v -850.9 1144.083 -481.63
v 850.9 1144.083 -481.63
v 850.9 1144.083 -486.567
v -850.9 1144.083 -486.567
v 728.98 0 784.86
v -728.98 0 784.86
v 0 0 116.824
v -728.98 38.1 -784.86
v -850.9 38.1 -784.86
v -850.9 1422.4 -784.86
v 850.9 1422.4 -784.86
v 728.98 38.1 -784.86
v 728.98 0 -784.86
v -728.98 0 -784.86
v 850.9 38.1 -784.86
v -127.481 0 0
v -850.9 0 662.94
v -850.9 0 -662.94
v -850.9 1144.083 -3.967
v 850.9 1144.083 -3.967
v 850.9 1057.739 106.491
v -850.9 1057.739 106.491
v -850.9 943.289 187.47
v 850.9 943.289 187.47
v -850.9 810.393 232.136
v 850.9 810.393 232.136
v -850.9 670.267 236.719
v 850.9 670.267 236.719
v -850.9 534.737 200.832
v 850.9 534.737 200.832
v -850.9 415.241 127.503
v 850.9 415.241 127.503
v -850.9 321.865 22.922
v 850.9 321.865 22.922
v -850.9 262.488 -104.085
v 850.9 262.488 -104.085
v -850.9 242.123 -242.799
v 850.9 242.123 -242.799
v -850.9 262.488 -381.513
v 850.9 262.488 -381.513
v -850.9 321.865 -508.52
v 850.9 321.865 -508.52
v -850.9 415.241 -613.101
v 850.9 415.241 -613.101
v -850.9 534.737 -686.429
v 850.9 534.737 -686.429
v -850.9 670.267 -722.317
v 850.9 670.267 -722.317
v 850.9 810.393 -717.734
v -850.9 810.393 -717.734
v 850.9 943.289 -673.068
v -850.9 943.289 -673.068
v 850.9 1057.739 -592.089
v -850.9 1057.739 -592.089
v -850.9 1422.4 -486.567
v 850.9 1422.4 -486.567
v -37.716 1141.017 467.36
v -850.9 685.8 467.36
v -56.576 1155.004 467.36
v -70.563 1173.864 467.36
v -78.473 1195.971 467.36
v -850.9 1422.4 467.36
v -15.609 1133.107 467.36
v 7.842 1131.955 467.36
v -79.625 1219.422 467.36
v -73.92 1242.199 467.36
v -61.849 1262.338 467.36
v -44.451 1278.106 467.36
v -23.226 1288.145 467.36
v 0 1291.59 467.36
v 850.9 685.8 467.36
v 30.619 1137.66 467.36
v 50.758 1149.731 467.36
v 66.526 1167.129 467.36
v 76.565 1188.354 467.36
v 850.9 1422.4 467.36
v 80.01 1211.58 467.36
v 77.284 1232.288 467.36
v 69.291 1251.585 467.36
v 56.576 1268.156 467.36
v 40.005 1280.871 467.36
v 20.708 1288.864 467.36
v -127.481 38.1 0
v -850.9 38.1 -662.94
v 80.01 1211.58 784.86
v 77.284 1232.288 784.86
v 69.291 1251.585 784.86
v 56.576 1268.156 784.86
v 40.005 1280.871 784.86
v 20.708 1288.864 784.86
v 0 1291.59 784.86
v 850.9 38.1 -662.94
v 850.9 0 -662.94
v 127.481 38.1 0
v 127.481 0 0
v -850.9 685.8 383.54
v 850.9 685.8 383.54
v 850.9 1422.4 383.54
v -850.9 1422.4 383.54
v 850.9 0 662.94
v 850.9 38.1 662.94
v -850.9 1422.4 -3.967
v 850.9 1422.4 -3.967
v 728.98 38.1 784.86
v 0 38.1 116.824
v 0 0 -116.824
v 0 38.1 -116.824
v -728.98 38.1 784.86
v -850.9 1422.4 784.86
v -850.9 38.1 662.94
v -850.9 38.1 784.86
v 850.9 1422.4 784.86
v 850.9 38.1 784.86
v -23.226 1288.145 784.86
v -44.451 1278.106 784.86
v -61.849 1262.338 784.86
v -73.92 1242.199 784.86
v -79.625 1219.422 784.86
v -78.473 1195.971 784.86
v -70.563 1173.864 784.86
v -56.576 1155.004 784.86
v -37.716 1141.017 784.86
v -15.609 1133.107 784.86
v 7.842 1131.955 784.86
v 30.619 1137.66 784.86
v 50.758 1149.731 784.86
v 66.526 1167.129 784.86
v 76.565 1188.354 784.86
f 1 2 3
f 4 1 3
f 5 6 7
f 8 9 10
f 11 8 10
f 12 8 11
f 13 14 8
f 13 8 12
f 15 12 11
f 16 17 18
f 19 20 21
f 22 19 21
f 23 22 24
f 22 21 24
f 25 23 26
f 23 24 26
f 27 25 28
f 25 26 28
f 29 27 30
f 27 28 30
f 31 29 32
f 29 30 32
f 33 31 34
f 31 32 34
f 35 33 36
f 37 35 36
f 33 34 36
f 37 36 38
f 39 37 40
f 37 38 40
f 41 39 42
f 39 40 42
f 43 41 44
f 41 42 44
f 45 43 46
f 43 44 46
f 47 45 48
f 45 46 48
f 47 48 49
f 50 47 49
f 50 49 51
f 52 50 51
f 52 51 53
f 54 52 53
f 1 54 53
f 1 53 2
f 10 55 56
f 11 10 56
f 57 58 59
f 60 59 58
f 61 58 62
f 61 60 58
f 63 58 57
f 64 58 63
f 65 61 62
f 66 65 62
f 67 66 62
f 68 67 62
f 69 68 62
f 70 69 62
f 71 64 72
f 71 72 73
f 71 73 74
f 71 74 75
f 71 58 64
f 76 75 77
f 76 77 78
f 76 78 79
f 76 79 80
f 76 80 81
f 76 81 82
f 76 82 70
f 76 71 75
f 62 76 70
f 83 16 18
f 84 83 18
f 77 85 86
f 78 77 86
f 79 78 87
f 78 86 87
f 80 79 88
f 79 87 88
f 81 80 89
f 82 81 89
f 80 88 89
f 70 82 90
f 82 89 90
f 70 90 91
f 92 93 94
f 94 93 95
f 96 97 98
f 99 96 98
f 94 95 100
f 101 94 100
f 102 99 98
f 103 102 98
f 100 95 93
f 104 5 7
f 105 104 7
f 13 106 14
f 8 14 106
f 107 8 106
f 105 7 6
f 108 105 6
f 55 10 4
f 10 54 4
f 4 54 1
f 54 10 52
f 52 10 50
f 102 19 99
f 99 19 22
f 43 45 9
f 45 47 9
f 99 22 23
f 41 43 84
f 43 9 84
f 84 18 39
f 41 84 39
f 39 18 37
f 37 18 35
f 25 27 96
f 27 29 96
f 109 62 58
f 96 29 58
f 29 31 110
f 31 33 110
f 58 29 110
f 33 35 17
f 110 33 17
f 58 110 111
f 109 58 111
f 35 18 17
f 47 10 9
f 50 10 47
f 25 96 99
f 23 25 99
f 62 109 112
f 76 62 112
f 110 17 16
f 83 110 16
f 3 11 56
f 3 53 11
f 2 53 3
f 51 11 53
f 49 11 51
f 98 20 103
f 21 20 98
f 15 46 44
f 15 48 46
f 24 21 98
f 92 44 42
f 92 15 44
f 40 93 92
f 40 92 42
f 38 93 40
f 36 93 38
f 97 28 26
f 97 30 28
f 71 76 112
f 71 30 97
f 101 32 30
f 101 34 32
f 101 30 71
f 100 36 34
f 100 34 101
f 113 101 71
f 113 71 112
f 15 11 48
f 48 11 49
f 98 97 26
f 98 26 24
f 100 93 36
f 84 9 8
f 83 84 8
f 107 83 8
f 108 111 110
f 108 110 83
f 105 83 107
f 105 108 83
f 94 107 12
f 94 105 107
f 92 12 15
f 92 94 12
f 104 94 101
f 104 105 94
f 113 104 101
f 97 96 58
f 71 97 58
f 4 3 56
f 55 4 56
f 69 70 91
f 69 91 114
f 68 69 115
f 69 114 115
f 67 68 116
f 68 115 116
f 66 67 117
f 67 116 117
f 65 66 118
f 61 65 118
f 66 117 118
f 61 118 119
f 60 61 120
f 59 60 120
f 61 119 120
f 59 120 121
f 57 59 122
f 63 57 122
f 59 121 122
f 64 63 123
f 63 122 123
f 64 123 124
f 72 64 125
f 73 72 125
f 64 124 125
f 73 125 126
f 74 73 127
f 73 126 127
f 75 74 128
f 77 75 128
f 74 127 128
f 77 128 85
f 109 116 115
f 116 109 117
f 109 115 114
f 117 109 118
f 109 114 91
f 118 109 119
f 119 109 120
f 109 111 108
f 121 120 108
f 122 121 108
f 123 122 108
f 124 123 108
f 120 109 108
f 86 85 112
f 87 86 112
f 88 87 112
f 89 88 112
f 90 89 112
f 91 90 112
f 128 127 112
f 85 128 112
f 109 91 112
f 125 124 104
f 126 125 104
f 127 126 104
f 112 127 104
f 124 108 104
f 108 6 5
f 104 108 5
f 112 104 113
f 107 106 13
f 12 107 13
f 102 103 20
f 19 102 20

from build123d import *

# Parameters (mm, degrees)
F0_W     = 1701.8
F0_H     = 1569.72
F1_DEPTH = 1422.4
F3_DEPTH = 38.1
F5_DEPTH = 317.5
F7_DEPTH = 2110.74
F6_W     = 736.6
F6_H     = 83.82
F8_DEPTH = 3215.64


with BuildPart() as f1:
    # F0 (on Front) → F1 (new body)
    with BuildSketch(Plane.XZ):
        Rectangle(F0_W, F0_H)
    extrude(amount=-F1_DEPTH)

    # F2 (on face) → F3 (cut)
    with BuildSketch(Plane.XZ):
        Polygon((728.98, -784.86), (850.9, -784.86), (850.9, -662.94), (127.4812631579, 0), (0, -116.8236655949), align=None)
        Polygon((-728.98, -784.86), (0, -116.8236655949), (-127.4812631579, 0), (-850.9, -662.94), (-850.9, -784.86), align=None)
        Polygon((0, -116.8236655949), (127.4812631579, 0), (0, 116.8236655949), (-127.4812631579, 0), align=None)
        Polygon((-127.4812631579, 0), (0, 116.8236655949), (-728.98, 784.86), (-850.9, 784.86), (-850.9, 662.94), align=None)
        Polygon((0, 116.8236655949), (127.4812631579, 0), (850.9, 662.94), (850.9, 784.86), (728.98, 784.86), align=None)
    extrude(amount=-F3_DEPTH, mode=Mode.SUBTRACT)

    # F4 (on face) → F5 (cut)
    with BuildSketch(Plane.XY.offset(784.86)):
        with BuildLine():
            ThreePointArc((0, 1291.59), (-56.5756135627, 1155.0043864373), (80.01, 1211.58))
            ThreePointArc((80.01, 1211.58), (56.5756135627, 1268.1556135627), (0, 1291.59))
        make_face()
    extrude(amount=-F5_DEPTH, mode=Mode.SUBTRACT)

    # F6 (on face) → F7 (cut)
    with BuildSketch(Plane.YZ.offset(850.9)):
        with BuildLine():
            ThreePointArc((1207.3232198715, -242.7988052368), (1191.2452582352, -119.2676443058), (1144.0826574141, -3.9674376488))
            Line((1144.0826574141, -3.9674376488), (1144.0826574141, -481.6301728248))
            ThreePointArc((1144.0826574141, -481.6301728248), (1191.2452582352, -366.3299661679), (1207.3232198715, -242.7988052368))
        make_face()
        with BuildLine():
            Line((1144.0826574141, -481.6301728248), (1144.0826574141, -3.9674376488))
            ThreePointArc((1144.0826574141, -3.9674376488), (242.1232198715, -242.7988052368), (1144.0826574141, -481.6301728248))
        make_face()
        with BuildLine():
            Line((1422.4, -486.5674376488), (1422.4, -3.9674376488))
            Line((1422.4, -3.9674376488), (1144.0826574141, -3.9674376488))
            ThreePointArc((1144.0826574141, -3.9674376488), (1191.2452582352, -119.2676443058), (1207.3232198715, -242.7988052368))
            ThreePointArc((1207.3232198715, -242.7988052368), (1191.2452582352, -366.3299661679), (1144.0826574141, -481.6301728248))
            Line((1144.0826574141, -481.6301728248), (1144.0826574141, -486.5674376488))
            Line((1144.0826574141, -486.5674376488), (1422.4, -486.5674376488))
        make_face()
    extrude(amount=-F7_DEPTH, mode=Mode.SUBTRACT)

    # F6 (on face) → F8 (cut)
    with BuildSketch(Plane.YZ.offset(850.9)):
        with Locations((1054.1, 425.45)):
            Rectangle(F6_W, F6_H)
    extrude(amount=-F8_DEPTH, mode=Mode.SUBTRACT)


solid = f1.part
